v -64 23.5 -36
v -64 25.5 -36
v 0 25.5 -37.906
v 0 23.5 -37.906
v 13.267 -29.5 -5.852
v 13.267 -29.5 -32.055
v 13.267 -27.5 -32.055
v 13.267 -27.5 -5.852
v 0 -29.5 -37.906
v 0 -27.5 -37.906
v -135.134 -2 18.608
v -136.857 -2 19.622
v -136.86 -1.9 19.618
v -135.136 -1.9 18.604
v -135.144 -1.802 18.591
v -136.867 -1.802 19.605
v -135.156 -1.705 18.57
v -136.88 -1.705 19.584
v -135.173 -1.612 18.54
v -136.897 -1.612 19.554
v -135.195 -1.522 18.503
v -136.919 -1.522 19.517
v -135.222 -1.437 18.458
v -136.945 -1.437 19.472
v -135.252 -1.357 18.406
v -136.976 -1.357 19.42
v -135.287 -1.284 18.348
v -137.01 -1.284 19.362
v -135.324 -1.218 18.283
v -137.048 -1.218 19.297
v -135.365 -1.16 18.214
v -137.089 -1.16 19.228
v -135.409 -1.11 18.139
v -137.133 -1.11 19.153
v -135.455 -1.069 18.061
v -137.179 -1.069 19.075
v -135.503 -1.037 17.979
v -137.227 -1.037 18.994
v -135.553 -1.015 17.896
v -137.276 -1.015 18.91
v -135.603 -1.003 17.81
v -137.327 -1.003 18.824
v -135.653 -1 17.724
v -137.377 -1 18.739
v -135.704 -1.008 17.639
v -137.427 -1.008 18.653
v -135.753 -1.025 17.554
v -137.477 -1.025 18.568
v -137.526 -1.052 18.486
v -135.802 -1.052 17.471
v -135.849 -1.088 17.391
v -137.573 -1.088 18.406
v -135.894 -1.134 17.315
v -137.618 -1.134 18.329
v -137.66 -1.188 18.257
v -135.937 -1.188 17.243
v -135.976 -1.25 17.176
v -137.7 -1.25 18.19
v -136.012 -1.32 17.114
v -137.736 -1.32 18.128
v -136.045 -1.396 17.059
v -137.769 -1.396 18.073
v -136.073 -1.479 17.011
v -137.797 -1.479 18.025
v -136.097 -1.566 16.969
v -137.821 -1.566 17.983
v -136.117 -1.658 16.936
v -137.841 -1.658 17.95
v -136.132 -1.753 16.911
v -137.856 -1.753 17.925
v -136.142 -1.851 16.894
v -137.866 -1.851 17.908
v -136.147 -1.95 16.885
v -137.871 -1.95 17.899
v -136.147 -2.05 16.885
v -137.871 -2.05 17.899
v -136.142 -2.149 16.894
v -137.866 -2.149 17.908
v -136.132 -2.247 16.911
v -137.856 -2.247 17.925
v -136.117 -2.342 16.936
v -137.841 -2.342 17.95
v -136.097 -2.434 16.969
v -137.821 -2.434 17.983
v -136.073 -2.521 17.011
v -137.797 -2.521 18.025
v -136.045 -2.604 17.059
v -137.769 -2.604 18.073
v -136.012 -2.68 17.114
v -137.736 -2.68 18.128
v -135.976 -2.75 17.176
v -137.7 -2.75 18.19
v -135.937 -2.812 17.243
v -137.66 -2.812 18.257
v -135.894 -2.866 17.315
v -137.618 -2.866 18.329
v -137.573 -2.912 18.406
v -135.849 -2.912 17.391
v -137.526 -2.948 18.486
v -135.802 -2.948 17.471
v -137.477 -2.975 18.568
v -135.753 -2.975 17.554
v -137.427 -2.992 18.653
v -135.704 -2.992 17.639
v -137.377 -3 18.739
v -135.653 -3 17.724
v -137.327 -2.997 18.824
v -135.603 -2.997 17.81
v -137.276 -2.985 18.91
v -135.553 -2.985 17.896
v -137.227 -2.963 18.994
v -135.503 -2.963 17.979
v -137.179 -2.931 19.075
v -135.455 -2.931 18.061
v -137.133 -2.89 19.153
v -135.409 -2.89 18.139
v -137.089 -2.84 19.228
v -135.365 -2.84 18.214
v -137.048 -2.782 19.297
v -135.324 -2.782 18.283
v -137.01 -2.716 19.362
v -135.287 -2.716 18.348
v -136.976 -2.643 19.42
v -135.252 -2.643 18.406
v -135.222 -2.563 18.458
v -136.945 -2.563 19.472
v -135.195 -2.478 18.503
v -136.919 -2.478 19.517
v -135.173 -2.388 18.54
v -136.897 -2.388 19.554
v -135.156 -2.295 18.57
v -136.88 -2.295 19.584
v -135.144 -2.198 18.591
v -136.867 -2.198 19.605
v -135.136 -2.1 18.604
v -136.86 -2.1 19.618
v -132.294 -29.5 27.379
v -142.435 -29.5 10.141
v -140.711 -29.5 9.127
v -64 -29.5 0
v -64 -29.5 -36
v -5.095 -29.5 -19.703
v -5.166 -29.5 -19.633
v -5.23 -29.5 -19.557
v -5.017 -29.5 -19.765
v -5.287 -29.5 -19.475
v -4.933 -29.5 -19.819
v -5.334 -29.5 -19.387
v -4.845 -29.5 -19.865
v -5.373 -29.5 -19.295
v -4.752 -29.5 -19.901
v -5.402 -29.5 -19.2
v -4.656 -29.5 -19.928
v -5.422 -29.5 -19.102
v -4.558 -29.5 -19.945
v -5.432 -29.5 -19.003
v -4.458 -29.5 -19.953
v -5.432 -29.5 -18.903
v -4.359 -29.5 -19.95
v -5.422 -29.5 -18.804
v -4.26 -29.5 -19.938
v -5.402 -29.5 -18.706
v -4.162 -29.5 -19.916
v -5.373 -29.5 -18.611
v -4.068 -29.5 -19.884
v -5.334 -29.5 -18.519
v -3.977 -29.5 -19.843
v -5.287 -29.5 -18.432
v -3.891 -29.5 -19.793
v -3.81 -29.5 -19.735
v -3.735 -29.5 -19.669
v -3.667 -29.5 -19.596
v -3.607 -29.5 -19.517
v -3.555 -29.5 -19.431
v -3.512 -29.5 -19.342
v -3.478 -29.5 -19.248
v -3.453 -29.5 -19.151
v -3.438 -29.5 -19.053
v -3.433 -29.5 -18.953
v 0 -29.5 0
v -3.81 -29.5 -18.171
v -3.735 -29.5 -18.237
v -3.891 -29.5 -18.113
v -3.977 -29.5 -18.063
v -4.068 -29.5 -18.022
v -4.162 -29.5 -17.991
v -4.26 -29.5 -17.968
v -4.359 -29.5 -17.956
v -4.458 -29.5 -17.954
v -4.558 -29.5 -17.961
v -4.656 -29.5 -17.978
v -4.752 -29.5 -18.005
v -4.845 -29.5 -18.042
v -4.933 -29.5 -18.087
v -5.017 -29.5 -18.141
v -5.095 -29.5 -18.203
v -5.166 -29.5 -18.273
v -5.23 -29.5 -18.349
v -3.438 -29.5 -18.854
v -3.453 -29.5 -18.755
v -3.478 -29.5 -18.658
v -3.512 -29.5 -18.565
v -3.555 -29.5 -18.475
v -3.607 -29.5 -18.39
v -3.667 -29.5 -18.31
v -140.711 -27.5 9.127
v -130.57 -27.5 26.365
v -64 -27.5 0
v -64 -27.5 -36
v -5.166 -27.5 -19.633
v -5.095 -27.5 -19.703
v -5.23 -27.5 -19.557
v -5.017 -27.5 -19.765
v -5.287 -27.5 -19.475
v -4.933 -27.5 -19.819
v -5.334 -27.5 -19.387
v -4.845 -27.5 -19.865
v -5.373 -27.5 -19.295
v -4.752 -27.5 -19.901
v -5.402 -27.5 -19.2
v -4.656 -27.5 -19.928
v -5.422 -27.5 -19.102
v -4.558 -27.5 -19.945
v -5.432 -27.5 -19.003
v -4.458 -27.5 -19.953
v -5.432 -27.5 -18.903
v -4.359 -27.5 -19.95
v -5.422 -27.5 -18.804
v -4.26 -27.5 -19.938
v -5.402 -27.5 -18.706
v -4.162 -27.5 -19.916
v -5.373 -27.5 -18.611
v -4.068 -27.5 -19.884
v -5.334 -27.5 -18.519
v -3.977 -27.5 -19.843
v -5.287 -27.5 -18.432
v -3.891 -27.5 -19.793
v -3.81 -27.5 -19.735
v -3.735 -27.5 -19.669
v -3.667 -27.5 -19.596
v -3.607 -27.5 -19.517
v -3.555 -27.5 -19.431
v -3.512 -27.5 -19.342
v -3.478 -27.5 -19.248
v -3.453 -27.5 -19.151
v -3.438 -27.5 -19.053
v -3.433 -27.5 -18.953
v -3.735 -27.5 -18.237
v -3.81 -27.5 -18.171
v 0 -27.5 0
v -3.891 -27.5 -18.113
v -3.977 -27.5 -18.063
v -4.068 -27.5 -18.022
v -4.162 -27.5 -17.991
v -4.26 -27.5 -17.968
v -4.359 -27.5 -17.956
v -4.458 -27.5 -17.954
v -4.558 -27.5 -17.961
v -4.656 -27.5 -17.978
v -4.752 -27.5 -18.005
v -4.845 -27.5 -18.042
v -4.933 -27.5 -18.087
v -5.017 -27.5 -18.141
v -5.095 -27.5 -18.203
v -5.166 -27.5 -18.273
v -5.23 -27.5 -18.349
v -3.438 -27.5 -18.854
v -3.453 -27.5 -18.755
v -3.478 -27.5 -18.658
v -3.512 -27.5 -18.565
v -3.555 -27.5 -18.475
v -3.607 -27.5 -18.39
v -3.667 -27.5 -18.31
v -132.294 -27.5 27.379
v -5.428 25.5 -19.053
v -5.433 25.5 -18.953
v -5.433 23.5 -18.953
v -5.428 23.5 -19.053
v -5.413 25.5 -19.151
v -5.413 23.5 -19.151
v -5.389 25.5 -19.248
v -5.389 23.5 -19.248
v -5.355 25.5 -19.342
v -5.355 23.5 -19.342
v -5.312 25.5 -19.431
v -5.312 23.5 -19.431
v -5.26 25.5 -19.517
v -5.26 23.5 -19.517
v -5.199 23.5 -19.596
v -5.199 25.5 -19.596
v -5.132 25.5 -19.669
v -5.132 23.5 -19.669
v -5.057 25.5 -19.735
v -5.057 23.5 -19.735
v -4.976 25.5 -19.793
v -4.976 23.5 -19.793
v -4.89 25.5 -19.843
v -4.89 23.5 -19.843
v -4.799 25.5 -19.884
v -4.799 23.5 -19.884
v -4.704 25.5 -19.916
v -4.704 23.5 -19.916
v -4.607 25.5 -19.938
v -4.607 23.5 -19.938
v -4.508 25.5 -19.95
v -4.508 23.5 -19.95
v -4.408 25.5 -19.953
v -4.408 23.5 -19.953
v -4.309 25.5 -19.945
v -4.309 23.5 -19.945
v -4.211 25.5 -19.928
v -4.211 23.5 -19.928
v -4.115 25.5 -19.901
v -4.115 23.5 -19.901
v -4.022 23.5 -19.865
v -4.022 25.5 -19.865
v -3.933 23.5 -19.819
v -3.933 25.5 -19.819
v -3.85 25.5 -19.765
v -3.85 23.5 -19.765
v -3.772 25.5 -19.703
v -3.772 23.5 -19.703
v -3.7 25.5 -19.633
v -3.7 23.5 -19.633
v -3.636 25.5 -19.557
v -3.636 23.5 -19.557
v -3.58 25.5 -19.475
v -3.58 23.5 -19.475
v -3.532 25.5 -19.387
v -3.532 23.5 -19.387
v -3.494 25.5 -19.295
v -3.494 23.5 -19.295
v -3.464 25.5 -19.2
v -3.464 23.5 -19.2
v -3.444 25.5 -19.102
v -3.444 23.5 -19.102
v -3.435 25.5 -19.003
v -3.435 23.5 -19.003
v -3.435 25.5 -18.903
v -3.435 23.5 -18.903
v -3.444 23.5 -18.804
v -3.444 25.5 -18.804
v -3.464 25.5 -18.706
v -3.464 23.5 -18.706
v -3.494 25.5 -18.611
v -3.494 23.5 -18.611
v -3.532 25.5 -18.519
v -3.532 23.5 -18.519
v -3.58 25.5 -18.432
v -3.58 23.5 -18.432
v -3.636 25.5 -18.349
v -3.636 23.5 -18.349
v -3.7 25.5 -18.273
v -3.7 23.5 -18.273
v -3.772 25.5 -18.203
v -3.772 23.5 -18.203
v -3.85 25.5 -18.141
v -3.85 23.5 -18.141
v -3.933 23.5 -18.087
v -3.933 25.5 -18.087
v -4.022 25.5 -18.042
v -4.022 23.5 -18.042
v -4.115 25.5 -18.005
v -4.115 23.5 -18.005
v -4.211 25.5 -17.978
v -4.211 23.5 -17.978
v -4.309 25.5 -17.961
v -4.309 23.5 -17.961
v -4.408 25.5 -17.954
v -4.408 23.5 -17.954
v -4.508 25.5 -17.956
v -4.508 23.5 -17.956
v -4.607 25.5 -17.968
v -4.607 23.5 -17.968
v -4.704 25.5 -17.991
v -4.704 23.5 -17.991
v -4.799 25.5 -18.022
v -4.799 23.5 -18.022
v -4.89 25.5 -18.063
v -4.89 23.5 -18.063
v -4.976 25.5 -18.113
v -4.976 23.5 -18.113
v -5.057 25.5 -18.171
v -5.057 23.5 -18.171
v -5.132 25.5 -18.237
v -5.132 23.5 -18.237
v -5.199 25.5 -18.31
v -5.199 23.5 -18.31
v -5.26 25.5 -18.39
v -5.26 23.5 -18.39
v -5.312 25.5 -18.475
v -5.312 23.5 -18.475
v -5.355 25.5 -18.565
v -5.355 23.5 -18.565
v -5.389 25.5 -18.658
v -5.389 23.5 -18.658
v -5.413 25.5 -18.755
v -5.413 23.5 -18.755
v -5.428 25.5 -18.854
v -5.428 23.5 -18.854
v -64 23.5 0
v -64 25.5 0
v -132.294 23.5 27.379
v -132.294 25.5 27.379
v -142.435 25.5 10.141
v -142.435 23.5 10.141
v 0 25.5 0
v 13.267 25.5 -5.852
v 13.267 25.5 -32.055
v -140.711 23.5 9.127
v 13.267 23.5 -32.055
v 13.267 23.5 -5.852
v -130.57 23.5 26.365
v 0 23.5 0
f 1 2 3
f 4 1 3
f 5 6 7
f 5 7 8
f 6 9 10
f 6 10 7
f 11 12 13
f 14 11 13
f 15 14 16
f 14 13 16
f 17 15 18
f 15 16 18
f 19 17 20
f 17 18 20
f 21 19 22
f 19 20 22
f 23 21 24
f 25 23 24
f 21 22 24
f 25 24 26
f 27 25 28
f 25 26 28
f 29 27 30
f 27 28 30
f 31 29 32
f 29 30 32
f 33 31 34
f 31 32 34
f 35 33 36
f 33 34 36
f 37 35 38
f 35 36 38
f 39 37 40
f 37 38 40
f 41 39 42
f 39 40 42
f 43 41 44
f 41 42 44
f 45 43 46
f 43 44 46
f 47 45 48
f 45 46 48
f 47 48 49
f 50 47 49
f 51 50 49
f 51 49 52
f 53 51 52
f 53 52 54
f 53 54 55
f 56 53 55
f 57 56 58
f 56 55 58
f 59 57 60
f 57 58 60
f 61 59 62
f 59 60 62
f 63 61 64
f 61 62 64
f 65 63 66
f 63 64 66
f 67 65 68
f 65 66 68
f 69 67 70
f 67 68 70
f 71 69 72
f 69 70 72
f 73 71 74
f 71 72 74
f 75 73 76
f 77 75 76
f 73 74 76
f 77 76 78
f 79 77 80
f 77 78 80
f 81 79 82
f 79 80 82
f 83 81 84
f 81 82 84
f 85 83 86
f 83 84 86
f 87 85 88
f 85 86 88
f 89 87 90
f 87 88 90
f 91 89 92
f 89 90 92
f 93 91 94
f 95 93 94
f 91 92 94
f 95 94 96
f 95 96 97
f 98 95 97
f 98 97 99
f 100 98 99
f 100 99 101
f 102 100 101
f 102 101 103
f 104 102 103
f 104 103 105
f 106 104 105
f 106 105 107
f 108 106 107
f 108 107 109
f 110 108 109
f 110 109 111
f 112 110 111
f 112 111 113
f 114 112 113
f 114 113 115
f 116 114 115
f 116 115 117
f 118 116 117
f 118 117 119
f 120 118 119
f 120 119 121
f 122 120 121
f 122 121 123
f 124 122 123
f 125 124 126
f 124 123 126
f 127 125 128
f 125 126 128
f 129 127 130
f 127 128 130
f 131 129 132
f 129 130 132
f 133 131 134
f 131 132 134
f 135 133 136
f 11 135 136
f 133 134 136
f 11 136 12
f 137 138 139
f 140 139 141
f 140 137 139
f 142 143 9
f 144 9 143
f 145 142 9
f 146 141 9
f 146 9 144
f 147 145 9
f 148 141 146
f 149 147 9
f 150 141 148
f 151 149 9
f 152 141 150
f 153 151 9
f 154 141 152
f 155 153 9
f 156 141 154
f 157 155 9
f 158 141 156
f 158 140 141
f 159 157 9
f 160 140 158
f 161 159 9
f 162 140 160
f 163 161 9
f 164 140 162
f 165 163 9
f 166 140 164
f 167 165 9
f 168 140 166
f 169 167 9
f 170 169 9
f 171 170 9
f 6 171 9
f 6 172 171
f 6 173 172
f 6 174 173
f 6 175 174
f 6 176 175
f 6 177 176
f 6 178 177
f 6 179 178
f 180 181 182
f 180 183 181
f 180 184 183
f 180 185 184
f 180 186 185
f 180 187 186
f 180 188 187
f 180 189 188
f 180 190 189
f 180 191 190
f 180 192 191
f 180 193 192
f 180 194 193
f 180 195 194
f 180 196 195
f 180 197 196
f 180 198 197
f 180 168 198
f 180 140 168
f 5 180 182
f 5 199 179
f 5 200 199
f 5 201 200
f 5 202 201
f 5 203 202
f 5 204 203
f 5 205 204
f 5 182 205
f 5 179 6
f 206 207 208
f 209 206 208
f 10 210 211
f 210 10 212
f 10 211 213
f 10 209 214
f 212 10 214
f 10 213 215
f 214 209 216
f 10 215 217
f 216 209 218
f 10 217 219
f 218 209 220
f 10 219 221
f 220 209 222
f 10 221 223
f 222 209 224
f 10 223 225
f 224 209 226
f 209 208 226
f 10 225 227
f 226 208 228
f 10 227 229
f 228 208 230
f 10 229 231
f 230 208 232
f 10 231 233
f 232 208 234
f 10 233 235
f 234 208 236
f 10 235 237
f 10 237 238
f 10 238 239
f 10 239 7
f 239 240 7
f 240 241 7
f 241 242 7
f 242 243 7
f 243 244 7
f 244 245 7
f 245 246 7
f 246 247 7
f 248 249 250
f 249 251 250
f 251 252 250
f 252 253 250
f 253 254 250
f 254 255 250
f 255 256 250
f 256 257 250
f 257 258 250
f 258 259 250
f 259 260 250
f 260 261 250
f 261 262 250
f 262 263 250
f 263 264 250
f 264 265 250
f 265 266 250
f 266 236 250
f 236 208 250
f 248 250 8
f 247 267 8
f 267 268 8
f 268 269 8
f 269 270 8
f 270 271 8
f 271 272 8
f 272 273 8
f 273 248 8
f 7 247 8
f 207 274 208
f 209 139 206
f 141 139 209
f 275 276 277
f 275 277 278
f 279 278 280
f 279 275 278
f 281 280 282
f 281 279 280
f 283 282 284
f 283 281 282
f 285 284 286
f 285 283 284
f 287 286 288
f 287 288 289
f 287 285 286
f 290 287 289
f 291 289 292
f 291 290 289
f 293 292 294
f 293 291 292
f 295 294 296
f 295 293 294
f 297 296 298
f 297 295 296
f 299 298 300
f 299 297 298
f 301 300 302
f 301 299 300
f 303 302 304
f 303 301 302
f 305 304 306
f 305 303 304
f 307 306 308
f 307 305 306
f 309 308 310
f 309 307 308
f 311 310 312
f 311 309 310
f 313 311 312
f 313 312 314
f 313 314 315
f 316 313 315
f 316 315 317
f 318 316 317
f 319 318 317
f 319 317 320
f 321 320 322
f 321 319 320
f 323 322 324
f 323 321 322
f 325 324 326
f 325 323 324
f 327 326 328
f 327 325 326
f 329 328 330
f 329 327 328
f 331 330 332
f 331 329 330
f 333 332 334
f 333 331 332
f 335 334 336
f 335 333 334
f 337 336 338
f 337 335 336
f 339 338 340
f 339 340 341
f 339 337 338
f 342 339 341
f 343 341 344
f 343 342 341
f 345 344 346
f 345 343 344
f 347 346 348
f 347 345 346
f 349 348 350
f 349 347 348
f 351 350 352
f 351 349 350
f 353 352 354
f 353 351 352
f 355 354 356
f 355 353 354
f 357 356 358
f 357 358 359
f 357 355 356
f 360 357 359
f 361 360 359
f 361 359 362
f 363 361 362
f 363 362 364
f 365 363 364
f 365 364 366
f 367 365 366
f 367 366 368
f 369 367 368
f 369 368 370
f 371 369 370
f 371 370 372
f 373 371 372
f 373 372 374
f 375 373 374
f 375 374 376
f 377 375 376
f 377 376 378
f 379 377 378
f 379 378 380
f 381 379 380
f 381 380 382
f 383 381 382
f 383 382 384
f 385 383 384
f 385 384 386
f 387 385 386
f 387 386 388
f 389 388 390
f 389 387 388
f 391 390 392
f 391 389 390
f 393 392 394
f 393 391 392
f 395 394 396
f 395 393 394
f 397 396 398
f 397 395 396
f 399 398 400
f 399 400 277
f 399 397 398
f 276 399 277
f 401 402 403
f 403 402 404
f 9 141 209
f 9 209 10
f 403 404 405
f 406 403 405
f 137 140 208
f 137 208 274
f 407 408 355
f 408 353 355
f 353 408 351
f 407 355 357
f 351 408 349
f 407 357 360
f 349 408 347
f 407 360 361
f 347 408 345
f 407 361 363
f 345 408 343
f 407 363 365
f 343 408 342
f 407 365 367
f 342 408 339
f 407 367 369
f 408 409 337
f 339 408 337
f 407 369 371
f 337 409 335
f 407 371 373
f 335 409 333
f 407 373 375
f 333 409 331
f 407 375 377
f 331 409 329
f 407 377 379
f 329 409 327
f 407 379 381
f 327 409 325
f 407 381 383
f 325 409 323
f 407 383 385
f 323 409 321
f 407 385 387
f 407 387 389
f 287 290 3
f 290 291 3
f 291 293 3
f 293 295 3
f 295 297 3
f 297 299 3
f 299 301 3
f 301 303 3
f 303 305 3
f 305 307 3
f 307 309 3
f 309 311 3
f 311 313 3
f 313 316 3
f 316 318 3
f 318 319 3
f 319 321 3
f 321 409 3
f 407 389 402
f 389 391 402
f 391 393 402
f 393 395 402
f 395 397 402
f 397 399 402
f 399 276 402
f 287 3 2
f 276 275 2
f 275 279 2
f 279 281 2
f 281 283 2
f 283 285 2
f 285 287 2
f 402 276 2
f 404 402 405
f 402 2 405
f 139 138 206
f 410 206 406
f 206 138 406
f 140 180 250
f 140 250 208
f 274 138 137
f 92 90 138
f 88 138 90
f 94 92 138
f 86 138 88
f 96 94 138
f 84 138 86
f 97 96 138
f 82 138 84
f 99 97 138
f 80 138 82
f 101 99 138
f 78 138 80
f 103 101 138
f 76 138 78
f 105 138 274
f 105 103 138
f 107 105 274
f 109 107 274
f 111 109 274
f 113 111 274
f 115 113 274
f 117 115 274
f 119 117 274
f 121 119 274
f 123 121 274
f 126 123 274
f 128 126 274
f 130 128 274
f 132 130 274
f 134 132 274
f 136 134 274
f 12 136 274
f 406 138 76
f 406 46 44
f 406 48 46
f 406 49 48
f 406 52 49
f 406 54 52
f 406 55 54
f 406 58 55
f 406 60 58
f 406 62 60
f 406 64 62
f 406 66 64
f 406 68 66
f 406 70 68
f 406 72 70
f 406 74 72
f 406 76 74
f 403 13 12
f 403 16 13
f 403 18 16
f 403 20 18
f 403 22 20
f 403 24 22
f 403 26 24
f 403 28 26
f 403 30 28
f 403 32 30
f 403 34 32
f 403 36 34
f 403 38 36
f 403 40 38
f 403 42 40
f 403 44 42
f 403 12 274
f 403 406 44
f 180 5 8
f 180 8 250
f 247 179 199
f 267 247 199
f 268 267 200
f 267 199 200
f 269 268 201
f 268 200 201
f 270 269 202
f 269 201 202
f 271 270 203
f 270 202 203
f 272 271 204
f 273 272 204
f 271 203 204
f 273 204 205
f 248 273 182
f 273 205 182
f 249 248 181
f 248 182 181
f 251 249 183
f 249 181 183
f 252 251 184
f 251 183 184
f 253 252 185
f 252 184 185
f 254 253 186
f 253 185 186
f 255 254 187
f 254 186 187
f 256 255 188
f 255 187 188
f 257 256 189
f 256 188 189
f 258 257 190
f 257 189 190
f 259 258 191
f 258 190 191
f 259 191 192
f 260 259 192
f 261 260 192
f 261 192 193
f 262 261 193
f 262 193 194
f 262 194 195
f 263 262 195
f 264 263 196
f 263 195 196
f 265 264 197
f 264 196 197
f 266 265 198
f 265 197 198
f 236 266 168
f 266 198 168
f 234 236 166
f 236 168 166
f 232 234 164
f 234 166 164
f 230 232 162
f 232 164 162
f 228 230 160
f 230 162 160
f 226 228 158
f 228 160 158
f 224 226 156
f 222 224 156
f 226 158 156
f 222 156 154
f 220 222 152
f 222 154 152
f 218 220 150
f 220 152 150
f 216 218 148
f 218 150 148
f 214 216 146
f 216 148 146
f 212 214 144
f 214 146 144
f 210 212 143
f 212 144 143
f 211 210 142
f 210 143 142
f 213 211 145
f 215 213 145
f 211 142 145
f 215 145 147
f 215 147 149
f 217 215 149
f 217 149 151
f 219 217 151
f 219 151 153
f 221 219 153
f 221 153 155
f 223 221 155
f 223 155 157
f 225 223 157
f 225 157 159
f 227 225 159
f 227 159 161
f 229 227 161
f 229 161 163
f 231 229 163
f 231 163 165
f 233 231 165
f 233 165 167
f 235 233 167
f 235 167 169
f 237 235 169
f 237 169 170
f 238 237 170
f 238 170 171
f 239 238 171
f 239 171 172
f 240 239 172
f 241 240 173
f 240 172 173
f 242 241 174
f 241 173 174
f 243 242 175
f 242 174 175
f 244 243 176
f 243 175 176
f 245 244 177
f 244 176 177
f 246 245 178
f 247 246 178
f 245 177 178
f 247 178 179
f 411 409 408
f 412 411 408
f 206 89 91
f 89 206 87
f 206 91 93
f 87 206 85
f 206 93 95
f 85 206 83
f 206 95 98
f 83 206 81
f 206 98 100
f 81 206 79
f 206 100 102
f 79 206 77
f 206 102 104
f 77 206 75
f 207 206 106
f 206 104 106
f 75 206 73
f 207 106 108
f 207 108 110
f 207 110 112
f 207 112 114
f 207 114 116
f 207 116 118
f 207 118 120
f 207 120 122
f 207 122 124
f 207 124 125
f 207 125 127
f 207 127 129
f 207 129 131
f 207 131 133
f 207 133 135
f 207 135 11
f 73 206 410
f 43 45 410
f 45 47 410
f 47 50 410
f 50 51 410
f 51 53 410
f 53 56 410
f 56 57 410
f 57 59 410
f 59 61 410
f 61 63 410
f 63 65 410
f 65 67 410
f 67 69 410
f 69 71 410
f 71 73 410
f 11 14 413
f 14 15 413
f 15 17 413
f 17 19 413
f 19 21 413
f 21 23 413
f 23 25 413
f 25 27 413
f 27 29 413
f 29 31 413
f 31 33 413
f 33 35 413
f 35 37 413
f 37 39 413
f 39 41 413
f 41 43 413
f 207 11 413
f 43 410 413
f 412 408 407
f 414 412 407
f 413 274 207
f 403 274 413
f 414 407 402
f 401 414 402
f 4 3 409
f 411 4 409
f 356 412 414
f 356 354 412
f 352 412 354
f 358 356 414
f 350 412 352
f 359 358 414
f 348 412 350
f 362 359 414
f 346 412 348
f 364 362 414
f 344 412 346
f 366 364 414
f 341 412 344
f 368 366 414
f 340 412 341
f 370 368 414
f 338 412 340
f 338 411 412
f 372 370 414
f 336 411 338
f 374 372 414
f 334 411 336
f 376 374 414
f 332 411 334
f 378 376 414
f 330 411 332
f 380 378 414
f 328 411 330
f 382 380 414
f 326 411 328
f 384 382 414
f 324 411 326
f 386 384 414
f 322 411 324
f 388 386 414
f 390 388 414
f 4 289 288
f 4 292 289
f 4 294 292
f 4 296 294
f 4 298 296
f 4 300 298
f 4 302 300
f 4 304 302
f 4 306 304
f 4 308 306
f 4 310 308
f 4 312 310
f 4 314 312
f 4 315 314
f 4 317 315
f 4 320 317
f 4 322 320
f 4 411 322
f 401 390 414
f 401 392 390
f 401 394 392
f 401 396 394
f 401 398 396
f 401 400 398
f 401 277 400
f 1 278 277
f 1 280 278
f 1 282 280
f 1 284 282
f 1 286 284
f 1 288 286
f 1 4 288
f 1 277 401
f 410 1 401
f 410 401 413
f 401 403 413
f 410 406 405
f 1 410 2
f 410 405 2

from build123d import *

# Parameters (mm, degrees)
EXTRUDE_3_DEPTH     = 2
SKETCH_5_R          = 1
CUT_EXTRUDE_3_DEPTH = 2
SKETCH_6_W          = 20
SKETCH_6_H          = 55
EXTRUDE_4_DEPTH     = 2
EXTRUDE_5_DEPTH     = 2
SKETCH_9_R          = 1
CUT_EXTRUDE_4_DEPTH = 2
SKETCH_10_R         = 1
CUT_EXTRUDE_5_DEPTH = 2


with BuildPart() as part:
    # 草图3 → 凸台-拉伸3 (new body)
    with BuildSketch(Plane(origin=(0, 25.5, 0), x_dir=(-1, 0, 0), z_dir=(0, -1, 0))):
        Polygon((0, 37.906440796), (-13.266709079, 32.054566719), (-13.266709079, 5.851874077), (0, 0), (64, 0), (132.293984031, -27.379269049), (142.434829102, -10.14084507), (64, 36), align=None)
    extrude(amount=EXTRUDE_3_DEPTH)

    # 草图5 → 切除-拉伸3 (cut)
    with BuildSketch(Plane(origin=(0, 25.5, 0), x_dir=(-1, 0, 0), z_dir=(0, -1, 0))):
        with Locations((4.433290921, 18.953220398)):
            Circle(SKETCH_5_R)
    extrude(amount=CUT_EXTRUDE_3_DEPTH, mode=Mode.SUBTRACT)

    # 草图6 → 凸台-拉伸4 (add)
    with BuildSketch(Plane(origin=(-110.247854089, 0, 64.855488475), x_dir=(0.507042254, 0, 0.861921199), z_dir=(-0.861921199, 0, 0.507042254))):
        with Locations((-53.479867386, -2)):
            Rectangle(SKETCH_6_W, SKETCH_6_H)
    extrude(amount=-EXTRUDE_4_DEPTH)

    # 草图8 → 凸台-拉伸5 (add)
    with BuildSketch(Plane.XZ.offset(29.5)):
        Polygon((0, 0), (-64, 0), (-132.293984031, 27.379269049), (-142.434829102, 10.14084507), (-64, -36), (0, -37.906440796), (13.266709079, -32.054566719), (13.266709079, -5.851874077), align=None)
    extrude(amount=-EXTRUDE_5_DEPTH)

    # 草图9 → 切除-拉伸4 (cut)
    with BuildSketch(Plane.XZ.offset(29.5)):
        with Locations((-4.433290921, -18.953220398)):
            Circle(SKETCH_9_R)
    extrude(amount=-CUT_EXTRUDE_4_DEPTH, mode=Mode.SUBTRACT)

    # 草图10 → 切除-拉伸5 (cut)
    with BuildSketch(Plane(origin=(-110.247854089, 0, 64.855488475), x_dir=(0.507042254, 0, 0.861921199), z_dir=(-0.861921199, 0, 0.507042254))):
        with Locations((-53.479867386, -2)):
            Circle(SKETCH_10_R)
    extrude(amount=-CUT_EXTRUDE_5_DEPTH, mode=Mode.SUBTRACT)


solid = part.part
